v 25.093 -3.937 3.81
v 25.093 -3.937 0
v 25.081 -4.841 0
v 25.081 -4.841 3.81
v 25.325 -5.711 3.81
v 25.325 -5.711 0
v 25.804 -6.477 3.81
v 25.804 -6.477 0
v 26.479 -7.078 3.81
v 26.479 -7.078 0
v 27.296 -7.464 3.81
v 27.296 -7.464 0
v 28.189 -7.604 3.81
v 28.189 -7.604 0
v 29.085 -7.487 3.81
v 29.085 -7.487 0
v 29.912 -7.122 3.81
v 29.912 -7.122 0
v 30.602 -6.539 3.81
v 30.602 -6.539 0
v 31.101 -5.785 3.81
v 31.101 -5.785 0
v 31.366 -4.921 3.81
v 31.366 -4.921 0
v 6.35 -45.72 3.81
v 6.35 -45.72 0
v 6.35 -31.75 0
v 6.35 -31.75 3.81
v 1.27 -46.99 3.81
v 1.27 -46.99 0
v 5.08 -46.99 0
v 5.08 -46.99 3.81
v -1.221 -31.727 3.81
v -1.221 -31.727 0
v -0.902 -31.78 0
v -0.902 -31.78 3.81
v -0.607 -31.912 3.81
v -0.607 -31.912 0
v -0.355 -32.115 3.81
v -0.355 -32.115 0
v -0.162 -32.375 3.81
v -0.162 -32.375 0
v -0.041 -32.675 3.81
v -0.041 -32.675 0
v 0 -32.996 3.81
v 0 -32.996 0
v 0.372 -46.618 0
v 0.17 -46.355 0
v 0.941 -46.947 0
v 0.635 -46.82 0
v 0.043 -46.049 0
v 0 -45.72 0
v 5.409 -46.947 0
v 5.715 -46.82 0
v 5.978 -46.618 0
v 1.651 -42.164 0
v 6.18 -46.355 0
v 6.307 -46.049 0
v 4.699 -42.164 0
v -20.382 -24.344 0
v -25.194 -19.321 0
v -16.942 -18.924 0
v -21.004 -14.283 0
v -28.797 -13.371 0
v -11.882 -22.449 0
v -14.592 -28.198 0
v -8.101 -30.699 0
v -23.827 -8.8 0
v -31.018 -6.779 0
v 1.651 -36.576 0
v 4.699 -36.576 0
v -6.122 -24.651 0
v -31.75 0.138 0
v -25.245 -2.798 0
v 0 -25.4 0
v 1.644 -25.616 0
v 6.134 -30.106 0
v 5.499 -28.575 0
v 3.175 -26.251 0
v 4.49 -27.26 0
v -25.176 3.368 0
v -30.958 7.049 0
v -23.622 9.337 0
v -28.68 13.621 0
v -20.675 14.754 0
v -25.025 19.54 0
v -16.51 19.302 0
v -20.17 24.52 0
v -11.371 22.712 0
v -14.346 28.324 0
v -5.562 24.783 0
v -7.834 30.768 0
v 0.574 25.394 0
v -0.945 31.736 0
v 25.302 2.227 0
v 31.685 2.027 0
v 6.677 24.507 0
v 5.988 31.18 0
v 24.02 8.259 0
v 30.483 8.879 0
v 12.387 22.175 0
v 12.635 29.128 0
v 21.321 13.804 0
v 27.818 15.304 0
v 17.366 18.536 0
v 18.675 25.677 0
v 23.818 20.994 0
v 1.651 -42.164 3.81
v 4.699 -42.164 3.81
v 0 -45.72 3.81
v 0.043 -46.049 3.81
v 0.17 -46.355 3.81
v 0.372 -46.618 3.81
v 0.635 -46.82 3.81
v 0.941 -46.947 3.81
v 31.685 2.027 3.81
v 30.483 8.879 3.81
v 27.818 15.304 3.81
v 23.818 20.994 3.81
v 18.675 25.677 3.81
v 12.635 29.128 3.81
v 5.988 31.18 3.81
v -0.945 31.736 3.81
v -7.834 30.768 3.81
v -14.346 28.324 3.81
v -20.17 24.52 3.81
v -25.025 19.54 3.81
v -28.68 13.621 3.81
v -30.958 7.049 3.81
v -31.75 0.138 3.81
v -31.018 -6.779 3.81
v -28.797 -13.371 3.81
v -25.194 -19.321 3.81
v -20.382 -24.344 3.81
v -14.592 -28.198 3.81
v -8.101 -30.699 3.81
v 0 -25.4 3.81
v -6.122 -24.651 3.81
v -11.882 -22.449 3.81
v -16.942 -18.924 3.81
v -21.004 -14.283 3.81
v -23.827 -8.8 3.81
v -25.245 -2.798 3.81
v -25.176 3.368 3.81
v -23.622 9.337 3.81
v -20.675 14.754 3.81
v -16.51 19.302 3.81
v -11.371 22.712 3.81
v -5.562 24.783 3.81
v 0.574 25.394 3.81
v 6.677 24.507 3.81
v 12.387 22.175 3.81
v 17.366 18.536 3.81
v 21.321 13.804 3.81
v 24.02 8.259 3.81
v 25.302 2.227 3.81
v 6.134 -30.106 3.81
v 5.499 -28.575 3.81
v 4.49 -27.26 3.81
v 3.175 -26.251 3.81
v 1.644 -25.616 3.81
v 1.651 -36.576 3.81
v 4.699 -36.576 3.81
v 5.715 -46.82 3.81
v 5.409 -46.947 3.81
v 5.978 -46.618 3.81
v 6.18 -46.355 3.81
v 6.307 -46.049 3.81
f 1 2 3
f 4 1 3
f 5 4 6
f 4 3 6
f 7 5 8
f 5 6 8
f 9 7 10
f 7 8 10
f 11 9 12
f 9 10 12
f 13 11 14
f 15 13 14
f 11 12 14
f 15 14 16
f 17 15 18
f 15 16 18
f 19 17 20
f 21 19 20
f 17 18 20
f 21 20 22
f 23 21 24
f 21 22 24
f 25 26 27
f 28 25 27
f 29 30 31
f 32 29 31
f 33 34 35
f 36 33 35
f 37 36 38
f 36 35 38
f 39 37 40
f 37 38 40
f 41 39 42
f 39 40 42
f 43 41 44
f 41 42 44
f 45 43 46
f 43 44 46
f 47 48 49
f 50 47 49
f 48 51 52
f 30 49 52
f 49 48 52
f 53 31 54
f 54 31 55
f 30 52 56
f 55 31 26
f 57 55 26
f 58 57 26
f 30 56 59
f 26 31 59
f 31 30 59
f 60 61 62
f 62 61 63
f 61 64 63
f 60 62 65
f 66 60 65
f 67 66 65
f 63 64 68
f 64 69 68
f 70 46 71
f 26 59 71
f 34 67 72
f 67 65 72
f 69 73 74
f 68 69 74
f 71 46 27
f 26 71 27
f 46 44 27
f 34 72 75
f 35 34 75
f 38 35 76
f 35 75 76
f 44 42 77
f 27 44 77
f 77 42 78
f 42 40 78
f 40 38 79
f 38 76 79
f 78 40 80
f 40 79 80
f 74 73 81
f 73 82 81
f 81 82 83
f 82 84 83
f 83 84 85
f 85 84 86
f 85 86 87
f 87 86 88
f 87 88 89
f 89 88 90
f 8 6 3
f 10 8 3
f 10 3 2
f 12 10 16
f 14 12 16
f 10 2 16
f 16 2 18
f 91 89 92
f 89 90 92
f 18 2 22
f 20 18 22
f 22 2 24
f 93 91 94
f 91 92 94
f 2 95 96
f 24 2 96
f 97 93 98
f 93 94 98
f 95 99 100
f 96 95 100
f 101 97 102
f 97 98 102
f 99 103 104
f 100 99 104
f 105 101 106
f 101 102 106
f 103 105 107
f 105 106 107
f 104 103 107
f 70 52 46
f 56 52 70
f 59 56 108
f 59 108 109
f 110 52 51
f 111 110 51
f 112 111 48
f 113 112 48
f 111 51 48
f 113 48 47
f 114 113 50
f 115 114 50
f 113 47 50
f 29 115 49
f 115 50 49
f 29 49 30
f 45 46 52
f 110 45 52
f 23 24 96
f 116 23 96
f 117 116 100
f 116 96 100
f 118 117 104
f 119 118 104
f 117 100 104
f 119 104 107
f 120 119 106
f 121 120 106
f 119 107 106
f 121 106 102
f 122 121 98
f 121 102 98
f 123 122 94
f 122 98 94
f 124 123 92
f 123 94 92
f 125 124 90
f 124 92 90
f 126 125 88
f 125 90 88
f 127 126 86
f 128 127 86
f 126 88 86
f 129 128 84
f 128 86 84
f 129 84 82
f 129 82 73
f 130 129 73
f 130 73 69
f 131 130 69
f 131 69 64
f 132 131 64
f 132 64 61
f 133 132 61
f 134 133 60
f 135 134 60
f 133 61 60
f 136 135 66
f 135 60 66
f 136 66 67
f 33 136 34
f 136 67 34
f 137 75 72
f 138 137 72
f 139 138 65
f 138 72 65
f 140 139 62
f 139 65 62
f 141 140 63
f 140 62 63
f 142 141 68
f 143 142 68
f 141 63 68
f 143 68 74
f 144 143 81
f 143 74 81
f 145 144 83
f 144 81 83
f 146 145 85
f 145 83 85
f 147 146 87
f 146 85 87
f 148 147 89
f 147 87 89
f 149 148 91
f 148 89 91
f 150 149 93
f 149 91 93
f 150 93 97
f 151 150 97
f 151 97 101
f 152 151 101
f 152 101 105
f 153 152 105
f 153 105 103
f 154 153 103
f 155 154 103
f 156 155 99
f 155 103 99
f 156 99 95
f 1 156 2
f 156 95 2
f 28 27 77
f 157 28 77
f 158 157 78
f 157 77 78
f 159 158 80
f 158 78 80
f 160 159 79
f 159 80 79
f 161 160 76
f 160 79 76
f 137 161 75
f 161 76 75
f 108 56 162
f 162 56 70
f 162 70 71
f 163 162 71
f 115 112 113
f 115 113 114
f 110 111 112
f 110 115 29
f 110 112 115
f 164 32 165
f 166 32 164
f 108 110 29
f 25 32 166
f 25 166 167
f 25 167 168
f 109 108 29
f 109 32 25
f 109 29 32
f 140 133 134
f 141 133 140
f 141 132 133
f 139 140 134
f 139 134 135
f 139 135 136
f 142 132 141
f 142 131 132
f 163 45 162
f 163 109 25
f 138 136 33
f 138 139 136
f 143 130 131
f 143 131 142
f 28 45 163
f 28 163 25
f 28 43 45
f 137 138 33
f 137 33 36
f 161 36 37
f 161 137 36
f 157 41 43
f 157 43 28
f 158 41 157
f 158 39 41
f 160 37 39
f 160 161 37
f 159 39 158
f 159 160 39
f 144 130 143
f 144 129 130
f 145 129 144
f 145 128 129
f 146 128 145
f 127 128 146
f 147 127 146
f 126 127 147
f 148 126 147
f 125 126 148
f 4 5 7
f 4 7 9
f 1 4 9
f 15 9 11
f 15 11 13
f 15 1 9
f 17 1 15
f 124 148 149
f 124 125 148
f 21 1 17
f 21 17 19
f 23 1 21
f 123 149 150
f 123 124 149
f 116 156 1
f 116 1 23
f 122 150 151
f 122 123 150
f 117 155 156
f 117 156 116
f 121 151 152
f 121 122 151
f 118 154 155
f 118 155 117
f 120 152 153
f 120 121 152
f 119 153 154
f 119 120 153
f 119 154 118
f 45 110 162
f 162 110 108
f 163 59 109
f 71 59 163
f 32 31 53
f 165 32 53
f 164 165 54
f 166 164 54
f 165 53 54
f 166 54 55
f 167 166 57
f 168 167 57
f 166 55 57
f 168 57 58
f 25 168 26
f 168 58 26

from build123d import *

# Parameters (mm, degrees)
F0_W     = 3.048
F0_H     = 5.588
F1_DEPTH = 3.81


with BuildPart() as f1:
    # F0 (on Top) → F1 (new body)
    with BuildSketch(Plane.XY):
        with BuildLine():
            ThreePointArc((0, -25.4), (-16.51, 19.302329), (25.093028, -3.937))
            ThreePointArc((25.093028, -3.937), (27.737531, -7.565753), (31.366284, -4.92125))
            ThreePointArc((31.366284, -4.92125), (-20.169598, 24.520396), (-1.221154, -31.726508))
            ThreePointArc((-1.221154, -31.726508), (-0.354868, -32.114981), (0, -32.995568))
            Line((0, -32.995568), (0, -45.72))
            ThreePointArc((0, -45.72), (0.371974, -46.618026), (1.27, -46.99))
            Line((1.27, -46.99), (5.08, -46.99))
            ThreePointArc((5.08, -46.99), (5.978026, -46.618026), (6.35, -45.72))
            Line((6.35, -45.72), (6.35, -31.75))
            ThreePointArc((6.35, -31.75), (4.490128, -27.259872), (0, -25.4))
        make_face()
        with Locations((3.175, -39.37)):
            Rectangle(F0_W, F0_H, mode=Mode.SUBTRACT)
    extrude(amount=F1_DEPTH)


solid = f1.part
